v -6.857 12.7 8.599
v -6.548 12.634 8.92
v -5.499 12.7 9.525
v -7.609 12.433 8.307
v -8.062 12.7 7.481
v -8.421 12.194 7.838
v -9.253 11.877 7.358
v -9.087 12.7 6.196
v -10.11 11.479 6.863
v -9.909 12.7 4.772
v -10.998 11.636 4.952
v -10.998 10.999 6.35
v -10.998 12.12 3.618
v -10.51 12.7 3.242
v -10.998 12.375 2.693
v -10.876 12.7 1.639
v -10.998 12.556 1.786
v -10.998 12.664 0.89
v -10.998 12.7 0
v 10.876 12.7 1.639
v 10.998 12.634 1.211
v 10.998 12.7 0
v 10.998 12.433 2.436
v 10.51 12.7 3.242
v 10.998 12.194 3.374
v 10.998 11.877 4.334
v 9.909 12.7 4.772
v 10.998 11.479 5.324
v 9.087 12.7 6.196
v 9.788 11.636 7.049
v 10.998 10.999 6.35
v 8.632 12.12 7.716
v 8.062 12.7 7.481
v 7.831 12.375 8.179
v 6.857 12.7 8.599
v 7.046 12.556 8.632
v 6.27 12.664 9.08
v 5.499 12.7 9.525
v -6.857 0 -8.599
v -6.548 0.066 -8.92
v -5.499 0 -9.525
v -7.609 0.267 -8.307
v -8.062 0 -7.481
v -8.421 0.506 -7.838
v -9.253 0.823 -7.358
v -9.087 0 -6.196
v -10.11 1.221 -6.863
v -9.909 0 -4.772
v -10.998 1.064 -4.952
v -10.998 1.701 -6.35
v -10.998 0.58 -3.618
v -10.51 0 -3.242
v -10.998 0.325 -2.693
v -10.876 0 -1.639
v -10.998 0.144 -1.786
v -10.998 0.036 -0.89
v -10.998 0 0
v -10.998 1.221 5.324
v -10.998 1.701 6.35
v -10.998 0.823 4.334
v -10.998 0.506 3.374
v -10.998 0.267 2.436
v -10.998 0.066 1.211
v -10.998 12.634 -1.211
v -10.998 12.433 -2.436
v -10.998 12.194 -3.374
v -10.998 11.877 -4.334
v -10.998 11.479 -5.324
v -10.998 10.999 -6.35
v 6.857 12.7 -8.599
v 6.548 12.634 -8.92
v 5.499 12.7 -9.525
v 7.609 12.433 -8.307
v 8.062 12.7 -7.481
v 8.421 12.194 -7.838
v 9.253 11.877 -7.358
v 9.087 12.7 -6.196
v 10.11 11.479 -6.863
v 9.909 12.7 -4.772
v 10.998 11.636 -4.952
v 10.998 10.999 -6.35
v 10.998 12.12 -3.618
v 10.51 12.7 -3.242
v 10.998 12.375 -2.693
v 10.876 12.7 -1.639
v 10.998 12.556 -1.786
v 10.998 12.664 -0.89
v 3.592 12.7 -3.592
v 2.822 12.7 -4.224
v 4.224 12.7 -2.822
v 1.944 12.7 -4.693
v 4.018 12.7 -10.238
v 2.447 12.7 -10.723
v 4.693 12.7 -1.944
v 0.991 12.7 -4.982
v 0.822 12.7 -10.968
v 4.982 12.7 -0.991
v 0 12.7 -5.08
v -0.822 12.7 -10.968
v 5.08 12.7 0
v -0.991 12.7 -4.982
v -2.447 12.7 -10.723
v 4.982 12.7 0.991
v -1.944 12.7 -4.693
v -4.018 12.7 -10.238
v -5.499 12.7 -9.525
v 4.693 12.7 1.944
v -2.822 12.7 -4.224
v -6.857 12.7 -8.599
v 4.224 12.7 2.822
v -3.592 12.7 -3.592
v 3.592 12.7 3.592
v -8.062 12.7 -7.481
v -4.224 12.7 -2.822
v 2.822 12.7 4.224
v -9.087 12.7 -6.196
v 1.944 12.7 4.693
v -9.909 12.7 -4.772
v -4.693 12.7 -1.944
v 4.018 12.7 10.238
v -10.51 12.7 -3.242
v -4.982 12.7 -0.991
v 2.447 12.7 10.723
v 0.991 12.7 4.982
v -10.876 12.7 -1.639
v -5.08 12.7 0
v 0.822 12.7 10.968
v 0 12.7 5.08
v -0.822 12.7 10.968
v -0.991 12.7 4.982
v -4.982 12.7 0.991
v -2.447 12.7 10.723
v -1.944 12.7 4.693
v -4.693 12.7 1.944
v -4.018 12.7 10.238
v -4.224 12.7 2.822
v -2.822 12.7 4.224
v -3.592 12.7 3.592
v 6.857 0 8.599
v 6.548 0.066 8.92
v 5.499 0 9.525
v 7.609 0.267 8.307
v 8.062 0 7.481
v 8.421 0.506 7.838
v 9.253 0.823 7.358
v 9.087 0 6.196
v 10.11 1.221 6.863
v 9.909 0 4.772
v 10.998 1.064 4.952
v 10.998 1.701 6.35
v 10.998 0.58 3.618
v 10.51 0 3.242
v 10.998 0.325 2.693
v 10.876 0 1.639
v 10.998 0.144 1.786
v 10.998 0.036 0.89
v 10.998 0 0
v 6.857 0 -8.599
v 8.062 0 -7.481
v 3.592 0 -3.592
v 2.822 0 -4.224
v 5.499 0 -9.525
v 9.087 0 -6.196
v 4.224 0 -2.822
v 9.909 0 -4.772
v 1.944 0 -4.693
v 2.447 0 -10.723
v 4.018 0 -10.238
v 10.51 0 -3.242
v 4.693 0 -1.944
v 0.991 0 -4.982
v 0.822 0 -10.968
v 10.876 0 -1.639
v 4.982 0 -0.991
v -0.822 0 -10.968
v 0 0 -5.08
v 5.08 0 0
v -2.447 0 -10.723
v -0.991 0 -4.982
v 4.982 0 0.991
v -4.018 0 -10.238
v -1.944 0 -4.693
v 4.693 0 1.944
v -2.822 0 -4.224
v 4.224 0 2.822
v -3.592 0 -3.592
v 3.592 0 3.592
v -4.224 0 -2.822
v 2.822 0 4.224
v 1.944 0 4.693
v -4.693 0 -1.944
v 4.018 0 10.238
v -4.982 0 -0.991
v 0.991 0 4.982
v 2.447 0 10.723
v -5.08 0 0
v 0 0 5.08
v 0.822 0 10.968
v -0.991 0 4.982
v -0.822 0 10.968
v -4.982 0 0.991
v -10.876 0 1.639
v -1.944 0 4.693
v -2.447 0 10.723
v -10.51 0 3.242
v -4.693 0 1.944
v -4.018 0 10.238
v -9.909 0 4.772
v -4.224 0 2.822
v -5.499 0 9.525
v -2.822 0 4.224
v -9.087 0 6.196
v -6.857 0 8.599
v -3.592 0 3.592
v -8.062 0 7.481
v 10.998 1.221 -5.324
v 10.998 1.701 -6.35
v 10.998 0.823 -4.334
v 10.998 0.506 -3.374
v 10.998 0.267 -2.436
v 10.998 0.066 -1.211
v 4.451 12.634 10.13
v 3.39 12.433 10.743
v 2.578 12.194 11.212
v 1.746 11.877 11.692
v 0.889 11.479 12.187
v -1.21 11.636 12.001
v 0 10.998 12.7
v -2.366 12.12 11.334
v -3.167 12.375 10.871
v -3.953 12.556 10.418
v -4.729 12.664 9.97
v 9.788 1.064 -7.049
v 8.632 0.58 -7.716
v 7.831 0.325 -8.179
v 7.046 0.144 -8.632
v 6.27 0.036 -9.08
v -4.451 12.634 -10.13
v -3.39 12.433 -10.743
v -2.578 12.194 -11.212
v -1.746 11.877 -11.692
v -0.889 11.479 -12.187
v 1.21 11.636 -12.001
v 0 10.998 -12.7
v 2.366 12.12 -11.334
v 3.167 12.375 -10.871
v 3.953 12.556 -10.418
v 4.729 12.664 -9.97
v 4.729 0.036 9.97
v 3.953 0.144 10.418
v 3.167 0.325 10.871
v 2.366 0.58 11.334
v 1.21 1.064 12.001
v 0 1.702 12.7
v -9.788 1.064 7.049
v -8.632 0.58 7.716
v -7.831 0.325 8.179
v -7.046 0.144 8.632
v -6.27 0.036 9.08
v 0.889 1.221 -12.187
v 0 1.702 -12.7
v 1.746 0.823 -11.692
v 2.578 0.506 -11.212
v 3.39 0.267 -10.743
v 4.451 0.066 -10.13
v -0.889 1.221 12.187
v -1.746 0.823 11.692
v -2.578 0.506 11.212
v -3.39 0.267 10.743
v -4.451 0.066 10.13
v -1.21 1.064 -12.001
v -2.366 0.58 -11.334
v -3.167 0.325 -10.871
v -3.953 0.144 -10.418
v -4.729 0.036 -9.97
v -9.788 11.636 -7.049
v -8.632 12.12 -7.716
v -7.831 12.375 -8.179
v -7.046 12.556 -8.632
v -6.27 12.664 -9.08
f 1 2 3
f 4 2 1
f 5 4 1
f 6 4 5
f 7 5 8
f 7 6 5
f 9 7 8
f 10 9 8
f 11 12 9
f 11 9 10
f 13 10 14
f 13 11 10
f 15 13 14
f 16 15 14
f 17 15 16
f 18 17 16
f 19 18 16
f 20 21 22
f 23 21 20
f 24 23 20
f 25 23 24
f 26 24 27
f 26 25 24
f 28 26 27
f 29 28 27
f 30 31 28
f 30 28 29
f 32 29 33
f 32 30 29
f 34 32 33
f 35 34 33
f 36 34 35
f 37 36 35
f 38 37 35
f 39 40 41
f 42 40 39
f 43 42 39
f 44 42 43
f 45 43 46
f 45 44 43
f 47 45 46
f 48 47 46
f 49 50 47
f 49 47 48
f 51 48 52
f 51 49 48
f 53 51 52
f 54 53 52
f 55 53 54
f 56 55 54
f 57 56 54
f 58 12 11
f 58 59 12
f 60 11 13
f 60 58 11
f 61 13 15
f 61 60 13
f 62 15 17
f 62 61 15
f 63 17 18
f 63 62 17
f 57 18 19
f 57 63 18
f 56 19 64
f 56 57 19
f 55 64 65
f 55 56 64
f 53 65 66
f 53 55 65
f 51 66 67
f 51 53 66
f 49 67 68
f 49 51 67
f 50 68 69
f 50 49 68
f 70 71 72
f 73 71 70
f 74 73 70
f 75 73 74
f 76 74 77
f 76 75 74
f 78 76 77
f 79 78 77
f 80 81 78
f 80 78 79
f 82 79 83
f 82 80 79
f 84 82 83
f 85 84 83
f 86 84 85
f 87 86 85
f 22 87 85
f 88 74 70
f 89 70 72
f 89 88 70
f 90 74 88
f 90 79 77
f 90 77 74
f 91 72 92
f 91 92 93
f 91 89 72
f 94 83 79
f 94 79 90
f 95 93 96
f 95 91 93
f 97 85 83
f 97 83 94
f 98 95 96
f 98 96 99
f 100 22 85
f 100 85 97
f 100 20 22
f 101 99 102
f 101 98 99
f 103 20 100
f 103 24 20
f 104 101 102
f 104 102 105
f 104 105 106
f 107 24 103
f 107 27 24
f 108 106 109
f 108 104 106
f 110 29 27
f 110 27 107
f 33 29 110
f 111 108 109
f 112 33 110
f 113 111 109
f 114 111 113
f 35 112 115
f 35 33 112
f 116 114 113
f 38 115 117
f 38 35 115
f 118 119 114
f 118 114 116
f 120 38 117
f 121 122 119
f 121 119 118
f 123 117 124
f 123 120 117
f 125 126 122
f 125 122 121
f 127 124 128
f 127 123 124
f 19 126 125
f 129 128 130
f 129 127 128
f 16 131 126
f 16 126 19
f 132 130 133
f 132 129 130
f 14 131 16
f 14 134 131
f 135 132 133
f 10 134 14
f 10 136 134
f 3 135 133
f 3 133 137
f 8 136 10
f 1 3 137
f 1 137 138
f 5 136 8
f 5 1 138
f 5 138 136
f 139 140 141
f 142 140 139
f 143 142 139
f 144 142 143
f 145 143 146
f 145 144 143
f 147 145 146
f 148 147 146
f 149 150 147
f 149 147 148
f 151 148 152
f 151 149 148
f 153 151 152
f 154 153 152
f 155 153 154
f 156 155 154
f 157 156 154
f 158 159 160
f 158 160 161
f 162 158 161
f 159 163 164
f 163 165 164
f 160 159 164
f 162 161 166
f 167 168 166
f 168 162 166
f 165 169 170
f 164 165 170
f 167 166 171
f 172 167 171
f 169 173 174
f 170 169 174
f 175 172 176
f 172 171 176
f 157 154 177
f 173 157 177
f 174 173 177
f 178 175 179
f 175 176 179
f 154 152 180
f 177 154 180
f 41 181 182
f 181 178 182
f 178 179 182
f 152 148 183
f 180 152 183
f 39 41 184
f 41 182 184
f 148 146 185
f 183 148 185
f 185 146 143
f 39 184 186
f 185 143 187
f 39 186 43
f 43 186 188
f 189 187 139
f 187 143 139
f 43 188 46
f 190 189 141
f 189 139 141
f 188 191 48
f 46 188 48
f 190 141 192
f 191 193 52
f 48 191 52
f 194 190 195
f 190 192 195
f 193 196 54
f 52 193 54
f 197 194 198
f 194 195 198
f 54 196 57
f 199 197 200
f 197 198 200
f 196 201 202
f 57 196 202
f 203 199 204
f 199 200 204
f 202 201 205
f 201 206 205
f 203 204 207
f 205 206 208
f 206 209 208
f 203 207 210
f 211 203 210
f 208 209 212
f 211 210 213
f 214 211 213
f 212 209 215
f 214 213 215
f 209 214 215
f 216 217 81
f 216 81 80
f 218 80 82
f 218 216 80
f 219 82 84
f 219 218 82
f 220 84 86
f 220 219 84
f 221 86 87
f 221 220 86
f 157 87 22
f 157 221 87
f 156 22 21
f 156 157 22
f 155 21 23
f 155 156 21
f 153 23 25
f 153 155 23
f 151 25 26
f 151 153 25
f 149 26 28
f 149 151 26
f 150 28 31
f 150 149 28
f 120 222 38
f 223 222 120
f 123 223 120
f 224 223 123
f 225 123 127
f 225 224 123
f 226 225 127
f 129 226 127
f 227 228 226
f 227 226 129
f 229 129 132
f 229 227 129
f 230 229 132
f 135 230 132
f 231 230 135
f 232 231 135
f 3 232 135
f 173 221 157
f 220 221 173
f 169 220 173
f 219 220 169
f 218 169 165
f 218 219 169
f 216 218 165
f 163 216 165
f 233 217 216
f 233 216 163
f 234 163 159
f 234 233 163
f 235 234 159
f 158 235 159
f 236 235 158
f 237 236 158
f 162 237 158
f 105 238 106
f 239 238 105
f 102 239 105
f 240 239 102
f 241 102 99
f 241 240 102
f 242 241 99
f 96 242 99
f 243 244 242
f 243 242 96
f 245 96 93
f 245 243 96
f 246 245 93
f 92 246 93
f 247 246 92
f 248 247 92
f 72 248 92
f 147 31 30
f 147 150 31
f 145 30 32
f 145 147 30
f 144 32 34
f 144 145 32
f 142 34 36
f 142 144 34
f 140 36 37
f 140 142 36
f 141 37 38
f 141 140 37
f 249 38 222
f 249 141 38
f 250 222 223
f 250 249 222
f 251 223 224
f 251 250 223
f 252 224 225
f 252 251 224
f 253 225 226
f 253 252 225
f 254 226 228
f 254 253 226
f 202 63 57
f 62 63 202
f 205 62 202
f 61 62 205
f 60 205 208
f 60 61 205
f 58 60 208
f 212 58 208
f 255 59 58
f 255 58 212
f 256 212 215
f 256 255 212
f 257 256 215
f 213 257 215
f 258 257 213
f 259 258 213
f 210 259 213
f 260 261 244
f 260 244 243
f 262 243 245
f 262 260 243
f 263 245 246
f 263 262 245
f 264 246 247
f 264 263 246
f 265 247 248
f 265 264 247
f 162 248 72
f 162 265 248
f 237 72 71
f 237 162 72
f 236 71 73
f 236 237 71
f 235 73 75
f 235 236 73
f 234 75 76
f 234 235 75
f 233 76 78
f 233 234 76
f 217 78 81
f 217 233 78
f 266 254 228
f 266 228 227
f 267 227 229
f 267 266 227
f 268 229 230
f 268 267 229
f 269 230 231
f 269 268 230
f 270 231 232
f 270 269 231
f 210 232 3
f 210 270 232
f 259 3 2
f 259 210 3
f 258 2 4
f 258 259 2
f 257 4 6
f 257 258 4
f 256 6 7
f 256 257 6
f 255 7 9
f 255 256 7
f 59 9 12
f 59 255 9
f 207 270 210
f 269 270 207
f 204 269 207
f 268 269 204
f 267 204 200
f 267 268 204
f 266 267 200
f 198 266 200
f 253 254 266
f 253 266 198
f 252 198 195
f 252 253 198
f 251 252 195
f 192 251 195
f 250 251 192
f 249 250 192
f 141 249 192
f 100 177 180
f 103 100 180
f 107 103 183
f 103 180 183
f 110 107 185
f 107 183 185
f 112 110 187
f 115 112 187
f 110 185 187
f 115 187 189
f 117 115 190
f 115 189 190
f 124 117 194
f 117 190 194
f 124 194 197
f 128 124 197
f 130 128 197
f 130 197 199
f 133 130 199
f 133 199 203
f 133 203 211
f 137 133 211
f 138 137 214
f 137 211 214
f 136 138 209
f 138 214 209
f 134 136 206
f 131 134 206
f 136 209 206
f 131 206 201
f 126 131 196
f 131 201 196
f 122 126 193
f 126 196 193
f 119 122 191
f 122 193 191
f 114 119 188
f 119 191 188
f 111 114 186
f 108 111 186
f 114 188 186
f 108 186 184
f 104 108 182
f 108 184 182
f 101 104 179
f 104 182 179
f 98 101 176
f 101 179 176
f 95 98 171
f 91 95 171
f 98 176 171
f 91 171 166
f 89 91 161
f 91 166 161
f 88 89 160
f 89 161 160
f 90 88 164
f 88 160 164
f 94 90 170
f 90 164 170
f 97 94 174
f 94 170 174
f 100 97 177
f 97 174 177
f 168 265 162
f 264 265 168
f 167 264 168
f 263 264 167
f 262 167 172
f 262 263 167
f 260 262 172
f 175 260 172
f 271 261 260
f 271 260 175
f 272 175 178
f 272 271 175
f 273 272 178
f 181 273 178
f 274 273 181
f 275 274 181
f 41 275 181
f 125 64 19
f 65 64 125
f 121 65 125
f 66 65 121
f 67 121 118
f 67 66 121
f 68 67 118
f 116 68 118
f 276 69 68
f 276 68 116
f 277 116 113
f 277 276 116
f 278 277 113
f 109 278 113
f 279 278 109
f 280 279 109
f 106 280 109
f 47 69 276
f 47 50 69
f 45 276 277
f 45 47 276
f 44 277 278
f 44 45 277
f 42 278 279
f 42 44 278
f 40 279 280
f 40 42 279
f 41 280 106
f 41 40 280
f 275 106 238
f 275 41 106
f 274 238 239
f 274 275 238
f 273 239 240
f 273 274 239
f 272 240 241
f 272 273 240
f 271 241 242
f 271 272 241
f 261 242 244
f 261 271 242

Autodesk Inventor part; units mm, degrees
ref_plane "YZ Plane" through (0, 0, 0) normal (1, 0, 0) x (0, 1, 0)
ref_plane "XZ Plane" through (0, 0, 0) normal (0, 1, 0) x (-1, 0, 0)
ref_plane "XY Plane" through (0, 0, 0) normal (0, 0, 1) x (1, 0, 0)
sketch "Sketch1" plane through (0, 0, 0) normal (0, 1, 0) x (-1, 0, 0)
  line L0 (10.9985, -6.35) -> (0, -12.7)
  line L1 (0, -12.7) -> (-10.9985, -6.35)
  line L2 (-10.9985, -6.35) -> (-10.9985, 6.35)
  line L3 (-10.9985, 6.35) -> (0, 12.7)
  line L4 (0, 12.7) -> (10.9985, 6.35)
  line L5 (10.9985, 6.35) -> (10.9985, -6.35)
  point P0 (0, 0)
  point P1 (0, 0)
  dimension "d2" = 25.4
extrude "Extrusion1" add sketch "Sketch1" along normal blind 12.7
sketch "Sketch2" plane through (0, 12.7, 0) normal (0, 1, 0) x (1, 0, 0)
  circle A0 centre (0, 0) radius 10.9985
extrude "Extrusion2" cut sketch "Sketch2" against normal through all draft 45 keep common part
sketch "Sketch3" plane through (0, 0, 0) normal (0, -1, 0) x (1, 0, 0)
  circle A0 centre (0, 0) radius 10.9985
extrude "Extrusion3" cut sketch "Sketch3" against normal through all draft 45 keep common part
sketch "Sketch4" plane through (0, 0, 0) normal (0, -1, 0) x (1, 0, 0)
  circle A0 centre (0, 0) radius 5.08
  dimension "d9" = 10.16
extrude "Extrusion4" cut sketch "Sketch4" against normal through all
properties part number "Nut"
